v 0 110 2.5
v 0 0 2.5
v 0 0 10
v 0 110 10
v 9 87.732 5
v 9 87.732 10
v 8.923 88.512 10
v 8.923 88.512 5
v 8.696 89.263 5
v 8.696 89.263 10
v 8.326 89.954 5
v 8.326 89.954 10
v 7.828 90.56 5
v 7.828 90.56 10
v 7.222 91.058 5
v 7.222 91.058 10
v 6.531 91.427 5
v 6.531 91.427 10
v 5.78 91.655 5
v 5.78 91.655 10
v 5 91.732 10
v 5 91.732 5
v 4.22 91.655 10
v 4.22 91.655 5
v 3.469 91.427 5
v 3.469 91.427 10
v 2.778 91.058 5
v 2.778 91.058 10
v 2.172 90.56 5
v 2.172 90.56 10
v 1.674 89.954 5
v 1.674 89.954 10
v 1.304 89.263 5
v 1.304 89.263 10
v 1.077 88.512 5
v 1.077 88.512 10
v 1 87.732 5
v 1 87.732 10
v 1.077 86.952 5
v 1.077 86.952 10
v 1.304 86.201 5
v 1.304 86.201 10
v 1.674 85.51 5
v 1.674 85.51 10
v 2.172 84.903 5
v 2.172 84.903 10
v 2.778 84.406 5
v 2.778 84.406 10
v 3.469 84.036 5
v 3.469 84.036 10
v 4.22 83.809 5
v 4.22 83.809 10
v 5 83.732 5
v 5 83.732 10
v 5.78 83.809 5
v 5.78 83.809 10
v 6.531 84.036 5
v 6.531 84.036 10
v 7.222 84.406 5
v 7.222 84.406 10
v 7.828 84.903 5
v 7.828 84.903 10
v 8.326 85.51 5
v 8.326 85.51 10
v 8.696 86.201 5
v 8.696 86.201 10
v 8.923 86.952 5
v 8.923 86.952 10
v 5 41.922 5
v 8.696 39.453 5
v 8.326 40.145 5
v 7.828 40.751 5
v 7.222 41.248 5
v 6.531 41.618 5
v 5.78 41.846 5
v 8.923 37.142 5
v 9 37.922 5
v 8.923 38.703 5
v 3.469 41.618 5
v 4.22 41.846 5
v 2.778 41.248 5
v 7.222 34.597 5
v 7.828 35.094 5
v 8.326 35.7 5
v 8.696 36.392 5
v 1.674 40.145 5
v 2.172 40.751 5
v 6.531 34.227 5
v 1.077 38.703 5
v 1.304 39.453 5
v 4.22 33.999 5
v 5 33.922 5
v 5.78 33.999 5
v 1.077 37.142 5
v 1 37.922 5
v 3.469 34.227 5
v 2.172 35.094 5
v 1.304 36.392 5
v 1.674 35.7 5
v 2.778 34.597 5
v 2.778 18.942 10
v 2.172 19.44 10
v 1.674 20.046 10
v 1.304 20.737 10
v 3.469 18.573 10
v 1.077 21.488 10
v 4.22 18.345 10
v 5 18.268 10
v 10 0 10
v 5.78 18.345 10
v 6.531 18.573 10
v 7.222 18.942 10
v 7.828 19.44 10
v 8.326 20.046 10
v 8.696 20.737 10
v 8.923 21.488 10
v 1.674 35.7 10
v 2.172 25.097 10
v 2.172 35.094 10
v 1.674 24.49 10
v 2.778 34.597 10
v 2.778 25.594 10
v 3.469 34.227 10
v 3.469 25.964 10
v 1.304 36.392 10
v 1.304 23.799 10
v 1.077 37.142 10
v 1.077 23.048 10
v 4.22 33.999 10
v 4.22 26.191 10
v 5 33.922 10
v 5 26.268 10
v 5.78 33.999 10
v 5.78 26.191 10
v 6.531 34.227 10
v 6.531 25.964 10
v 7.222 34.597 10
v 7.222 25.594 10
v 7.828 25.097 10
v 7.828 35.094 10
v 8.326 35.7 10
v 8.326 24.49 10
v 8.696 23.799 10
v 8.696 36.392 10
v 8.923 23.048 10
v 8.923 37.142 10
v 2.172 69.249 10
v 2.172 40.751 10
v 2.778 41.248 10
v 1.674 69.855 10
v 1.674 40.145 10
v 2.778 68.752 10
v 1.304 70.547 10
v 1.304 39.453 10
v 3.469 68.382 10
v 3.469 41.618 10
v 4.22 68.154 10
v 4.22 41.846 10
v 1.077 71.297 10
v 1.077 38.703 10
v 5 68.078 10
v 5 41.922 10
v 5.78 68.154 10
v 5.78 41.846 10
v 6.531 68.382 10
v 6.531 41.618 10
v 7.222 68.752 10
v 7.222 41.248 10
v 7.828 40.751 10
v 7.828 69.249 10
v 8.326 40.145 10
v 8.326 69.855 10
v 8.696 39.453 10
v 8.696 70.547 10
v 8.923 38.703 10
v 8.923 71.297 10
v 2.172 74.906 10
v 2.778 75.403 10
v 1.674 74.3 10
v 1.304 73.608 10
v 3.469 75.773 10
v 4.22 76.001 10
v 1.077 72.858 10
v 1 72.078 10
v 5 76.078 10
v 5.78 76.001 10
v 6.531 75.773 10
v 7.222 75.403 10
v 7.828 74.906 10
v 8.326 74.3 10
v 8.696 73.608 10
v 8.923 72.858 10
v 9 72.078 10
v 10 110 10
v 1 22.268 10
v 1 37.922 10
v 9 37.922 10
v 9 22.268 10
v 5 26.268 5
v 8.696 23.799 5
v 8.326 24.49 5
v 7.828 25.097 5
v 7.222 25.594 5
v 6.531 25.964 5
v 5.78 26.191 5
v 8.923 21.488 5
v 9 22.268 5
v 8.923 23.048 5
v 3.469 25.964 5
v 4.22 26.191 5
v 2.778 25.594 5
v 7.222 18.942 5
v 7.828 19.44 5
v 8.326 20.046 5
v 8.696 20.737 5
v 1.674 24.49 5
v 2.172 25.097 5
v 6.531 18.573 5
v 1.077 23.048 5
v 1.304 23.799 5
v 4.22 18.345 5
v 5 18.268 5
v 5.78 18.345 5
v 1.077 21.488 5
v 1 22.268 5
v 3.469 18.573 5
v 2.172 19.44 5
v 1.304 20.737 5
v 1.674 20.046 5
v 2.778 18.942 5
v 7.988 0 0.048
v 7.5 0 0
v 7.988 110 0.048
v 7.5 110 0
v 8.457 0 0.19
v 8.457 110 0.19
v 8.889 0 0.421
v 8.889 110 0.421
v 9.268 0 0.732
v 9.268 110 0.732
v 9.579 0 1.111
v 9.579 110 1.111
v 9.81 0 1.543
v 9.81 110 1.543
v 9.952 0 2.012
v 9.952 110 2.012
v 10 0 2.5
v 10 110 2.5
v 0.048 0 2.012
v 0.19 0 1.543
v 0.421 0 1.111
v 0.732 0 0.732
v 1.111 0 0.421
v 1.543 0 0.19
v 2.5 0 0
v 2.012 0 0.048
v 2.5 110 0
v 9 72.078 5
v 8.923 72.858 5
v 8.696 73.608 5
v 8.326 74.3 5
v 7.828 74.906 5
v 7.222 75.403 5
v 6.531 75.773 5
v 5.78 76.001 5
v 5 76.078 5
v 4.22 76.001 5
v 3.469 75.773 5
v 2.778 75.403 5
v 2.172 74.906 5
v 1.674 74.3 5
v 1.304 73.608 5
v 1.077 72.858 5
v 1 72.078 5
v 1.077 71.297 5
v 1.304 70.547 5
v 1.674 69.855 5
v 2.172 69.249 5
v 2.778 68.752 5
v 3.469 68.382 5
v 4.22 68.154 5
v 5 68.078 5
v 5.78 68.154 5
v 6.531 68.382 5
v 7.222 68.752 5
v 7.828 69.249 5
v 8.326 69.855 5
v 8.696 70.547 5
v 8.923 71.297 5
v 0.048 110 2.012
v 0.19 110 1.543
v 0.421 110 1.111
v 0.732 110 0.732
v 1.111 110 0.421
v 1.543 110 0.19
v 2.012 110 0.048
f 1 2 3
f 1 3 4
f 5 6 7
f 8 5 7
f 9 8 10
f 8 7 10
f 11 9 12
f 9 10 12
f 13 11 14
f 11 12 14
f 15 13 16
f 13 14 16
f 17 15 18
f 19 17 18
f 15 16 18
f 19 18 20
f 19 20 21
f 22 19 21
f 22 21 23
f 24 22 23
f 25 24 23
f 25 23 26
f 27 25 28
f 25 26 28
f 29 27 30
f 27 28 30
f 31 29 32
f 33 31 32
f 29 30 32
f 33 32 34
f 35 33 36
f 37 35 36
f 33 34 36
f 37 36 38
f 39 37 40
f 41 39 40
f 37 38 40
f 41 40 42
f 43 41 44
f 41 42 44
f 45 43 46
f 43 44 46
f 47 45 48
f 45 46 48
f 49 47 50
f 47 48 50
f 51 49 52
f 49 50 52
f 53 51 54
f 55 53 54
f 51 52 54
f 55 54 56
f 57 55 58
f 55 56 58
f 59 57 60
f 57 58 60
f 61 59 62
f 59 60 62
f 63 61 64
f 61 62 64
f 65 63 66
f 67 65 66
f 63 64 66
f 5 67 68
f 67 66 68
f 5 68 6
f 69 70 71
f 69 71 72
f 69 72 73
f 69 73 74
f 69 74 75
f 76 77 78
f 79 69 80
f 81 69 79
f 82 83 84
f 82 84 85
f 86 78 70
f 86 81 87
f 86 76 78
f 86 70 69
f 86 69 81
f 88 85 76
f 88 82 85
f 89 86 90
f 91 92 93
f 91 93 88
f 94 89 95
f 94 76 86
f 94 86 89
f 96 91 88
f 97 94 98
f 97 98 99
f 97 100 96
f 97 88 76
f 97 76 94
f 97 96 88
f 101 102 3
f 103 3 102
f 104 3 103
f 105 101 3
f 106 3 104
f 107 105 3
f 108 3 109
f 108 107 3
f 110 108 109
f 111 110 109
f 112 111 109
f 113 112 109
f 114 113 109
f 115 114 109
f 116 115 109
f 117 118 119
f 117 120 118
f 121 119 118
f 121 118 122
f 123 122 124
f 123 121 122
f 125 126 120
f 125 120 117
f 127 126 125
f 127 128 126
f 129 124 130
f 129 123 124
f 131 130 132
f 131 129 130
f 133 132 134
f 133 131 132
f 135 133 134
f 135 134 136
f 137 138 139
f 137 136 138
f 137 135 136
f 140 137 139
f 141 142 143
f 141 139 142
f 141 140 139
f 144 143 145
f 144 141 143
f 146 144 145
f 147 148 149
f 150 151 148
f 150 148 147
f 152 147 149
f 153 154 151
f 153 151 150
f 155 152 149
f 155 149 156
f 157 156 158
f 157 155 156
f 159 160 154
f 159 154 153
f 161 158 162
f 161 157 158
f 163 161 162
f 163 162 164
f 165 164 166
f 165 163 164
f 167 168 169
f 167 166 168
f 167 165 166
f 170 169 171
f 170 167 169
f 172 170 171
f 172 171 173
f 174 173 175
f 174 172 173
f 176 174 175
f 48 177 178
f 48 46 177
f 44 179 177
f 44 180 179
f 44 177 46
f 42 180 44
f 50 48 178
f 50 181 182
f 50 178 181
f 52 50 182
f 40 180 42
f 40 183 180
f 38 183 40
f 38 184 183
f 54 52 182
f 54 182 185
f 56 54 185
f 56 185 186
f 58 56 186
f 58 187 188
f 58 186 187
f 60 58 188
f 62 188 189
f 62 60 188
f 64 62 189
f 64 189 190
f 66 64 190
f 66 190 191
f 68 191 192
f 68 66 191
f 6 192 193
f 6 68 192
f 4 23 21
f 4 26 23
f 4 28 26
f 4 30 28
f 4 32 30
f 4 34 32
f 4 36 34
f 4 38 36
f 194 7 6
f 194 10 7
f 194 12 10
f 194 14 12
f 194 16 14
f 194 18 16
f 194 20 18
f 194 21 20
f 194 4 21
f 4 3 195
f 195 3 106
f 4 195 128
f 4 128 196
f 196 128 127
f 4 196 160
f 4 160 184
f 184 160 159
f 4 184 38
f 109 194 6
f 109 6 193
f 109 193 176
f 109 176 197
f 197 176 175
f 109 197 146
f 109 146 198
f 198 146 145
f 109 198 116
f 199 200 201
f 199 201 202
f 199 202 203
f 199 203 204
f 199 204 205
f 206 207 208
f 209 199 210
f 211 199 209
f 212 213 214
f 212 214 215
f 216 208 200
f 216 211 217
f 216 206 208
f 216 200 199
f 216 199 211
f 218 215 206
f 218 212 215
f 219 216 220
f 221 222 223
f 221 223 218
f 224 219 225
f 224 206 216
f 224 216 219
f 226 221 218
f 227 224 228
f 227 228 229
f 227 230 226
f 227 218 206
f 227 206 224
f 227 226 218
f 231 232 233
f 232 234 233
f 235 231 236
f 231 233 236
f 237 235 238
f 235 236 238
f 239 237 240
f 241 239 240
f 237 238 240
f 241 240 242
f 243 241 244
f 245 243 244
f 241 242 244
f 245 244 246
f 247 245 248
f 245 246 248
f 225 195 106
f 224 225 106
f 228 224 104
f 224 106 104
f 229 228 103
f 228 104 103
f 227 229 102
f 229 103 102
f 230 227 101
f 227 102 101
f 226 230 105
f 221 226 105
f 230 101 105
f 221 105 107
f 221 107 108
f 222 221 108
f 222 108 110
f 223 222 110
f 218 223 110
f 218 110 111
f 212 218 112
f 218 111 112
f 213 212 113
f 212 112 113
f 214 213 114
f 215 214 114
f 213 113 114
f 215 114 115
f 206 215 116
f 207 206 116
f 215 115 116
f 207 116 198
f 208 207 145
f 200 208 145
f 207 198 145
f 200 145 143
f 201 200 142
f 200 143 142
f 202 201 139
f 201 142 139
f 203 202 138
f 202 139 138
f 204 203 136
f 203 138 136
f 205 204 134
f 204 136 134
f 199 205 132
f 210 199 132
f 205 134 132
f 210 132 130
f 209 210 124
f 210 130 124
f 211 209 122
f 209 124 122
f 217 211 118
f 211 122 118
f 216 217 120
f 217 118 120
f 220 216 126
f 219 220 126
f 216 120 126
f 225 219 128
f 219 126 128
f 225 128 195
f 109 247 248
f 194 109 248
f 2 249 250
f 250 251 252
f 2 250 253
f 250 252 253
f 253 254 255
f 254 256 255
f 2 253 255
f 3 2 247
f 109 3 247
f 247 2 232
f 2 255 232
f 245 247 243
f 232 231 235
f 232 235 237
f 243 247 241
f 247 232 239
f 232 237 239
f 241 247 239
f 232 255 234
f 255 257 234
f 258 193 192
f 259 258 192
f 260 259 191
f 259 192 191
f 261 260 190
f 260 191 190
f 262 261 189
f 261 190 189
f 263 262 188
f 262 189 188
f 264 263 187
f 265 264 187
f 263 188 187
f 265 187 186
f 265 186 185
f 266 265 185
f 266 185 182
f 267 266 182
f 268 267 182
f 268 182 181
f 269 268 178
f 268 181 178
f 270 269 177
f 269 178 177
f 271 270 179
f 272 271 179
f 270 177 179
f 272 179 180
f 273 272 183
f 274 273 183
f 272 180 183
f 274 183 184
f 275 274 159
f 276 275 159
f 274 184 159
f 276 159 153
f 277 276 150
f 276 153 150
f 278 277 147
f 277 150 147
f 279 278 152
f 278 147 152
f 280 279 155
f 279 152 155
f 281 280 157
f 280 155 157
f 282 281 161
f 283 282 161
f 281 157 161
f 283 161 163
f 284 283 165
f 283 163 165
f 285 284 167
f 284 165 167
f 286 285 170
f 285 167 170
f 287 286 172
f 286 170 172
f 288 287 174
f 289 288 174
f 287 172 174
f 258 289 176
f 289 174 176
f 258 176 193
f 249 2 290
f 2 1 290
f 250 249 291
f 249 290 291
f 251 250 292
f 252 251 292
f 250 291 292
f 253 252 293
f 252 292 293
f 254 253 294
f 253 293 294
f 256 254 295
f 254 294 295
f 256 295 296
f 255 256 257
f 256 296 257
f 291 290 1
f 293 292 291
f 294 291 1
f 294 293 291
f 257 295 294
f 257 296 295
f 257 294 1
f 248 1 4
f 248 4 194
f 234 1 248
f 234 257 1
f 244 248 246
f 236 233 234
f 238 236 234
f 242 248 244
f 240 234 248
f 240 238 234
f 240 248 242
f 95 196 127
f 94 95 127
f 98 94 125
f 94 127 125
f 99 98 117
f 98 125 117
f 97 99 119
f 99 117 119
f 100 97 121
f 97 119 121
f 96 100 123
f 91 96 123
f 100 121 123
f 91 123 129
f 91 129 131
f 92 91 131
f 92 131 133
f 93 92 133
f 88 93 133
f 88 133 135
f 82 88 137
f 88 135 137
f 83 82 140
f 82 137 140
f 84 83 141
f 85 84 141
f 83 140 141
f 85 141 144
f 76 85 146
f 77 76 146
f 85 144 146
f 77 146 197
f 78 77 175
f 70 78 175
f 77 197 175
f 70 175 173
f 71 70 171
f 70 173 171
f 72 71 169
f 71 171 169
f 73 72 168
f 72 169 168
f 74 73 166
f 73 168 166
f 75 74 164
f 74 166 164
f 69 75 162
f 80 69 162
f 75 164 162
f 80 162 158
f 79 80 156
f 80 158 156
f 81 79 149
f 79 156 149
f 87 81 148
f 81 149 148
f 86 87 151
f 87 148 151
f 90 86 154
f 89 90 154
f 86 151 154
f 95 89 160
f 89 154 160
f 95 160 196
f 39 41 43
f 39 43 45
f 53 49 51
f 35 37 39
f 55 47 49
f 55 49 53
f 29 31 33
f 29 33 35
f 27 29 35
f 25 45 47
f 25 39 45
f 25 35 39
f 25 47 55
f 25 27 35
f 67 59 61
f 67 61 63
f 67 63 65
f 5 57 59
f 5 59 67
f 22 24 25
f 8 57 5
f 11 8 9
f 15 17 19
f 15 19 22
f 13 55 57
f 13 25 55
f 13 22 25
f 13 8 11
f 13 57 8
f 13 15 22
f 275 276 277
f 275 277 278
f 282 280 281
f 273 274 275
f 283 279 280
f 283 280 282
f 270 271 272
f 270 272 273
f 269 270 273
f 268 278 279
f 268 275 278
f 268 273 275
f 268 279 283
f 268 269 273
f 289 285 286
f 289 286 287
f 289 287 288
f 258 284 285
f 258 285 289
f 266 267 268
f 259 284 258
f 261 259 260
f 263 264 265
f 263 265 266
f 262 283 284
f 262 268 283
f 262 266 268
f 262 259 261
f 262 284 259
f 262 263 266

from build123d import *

# Parameters (mm, degrees)
SKETCH2_W           = 10
SKETCH2_H           = 110
BOSS_EXTRUDE1_DEPTH = 10
SKETCH3_R           = 4
CUT_EXTRUDE1_DEPTH  = 5
FILLET1_R           = 2.5


with BuildPart() as part:
    # Sketch2 → Boss-Extrude1 (new body)
    with BuildSketch(Plane.XY):
        with Locations((5, 55)):
            Rectangle(SKETCH2_W, SKETCH2_H)
    extrude(amount=BOSS_EXTRUDE1_DEPTH)

    # Sketch3 → Cut-Extrude1 (cut)
    with BuildSketch(Plane.XY.offset(10)):
        with Locations((5, 87.731895651)):
            Circle(SKETCH3_R)
        with Locations((5, 72.077510774)):
            Circle(SKETCH3_R)
        with Locations(Location((5, 37.922489226, 0), (0, 0, 180))):
            Circle(SKETCH3_R)
        with Locations(Location((5, 22.268104349, 0), (0, 0, 180))):
            Circle(SKETCH3_R)
    extrude(amount=-CUT_EXTRUDE1_DEPTH, mode=Mode.SUBTRACT)

    # Fillet1
    fillet1_edges = [part.edges().sort_by_distance(p)[0] for p in [
        (0, 55, 0),
        (10, 55, 0),
    ]]
    fillet(fillet1_edges, radius=FILLET1_R)


solid = part.part
